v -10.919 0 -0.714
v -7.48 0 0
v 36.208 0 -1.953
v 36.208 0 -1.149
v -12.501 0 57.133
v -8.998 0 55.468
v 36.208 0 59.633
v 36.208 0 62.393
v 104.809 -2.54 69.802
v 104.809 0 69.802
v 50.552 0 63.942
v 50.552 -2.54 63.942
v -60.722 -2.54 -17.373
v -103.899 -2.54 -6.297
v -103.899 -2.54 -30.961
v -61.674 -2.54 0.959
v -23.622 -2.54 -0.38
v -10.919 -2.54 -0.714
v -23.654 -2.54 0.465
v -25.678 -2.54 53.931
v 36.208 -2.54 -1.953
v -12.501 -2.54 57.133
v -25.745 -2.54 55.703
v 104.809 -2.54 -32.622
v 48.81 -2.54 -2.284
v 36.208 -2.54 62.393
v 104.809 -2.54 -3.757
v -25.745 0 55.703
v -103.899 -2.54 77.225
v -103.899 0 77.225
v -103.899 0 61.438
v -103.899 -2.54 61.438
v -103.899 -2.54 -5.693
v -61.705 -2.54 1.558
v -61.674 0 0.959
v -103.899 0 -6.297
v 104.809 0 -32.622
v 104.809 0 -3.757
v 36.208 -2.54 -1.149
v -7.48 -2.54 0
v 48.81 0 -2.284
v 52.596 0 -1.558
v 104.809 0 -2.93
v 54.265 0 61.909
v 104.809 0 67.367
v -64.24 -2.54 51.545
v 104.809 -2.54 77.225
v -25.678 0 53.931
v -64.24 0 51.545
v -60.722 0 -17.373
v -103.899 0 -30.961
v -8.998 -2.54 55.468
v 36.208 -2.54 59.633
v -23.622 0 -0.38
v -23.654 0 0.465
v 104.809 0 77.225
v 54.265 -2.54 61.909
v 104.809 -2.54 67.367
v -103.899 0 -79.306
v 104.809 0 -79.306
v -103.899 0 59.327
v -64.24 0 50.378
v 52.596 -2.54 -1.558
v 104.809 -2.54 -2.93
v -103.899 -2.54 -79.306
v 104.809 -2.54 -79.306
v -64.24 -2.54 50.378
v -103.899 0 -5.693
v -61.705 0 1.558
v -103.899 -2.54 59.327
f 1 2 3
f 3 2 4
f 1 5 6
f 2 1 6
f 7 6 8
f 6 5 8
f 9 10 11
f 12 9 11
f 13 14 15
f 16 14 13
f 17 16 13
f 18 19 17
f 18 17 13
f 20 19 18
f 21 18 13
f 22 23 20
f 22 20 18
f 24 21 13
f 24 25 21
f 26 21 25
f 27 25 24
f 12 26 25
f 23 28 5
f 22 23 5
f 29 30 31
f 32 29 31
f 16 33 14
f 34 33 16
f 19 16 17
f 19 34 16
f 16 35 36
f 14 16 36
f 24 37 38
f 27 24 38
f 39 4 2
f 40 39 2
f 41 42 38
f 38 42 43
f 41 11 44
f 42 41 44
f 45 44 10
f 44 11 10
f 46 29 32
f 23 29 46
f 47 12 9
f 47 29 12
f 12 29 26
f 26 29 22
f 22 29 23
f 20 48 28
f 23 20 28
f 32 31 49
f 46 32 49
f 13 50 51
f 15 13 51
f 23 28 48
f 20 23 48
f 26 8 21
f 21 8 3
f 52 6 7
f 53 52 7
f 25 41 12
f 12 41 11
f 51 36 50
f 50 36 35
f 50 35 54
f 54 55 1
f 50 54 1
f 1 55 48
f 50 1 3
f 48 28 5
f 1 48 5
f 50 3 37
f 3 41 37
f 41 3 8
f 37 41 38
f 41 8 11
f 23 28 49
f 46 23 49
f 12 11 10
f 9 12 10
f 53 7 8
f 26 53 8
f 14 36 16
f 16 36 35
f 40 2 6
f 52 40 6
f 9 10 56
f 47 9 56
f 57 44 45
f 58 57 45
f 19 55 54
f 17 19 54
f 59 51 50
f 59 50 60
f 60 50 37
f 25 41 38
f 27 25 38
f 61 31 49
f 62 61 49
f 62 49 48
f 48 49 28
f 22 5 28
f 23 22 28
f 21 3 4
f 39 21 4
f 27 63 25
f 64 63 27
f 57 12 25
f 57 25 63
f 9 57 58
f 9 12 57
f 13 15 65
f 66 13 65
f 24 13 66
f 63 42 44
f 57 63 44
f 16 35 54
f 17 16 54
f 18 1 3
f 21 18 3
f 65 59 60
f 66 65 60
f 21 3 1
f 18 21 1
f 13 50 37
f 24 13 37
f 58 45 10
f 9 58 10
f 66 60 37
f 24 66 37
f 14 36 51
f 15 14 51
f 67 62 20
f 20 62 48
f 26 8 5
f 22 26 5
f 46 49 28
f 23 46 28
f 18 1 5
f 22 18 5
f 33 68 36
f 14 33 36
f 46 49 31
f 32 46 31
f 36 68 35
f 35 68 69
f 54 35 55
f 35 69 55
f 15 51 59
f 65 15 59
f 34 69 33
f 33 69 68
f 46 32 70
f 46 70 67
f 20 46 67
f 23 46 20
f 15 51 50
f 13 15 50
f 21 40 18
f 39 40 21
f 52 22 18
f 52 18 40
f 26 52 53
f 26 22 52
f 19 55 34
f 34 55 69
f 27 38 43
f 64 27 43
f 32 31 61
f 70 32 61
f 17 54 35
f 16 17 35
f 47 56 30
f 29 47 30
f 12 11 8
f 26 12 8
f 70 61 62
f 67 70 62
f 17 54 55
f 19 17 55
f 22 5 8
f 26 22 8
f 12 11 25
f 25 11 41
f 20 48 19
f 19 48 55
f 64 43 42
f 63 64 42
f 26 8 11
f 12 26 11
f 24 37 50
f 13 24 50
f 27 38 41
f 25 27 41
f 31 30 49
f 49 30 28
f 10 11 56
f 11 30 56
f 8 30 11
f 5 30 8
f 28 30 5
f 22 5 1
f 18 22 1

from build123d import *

# Parameters (mm, degrees)
F2_DEPTH = 2.54
F3_DEPTH = 2.54
F4_DEPTH = 2.54
F5_DEPTH = 2.54


with BuildPart() as f2:
    # F1 (on Front) → F2 (new body)
    with BuildSketch(Plane.XZ):
        Polygon((-60.72167, -17.372691), (-103.898698, -30.960672), (-103.898698, -79.305868), (104.809191, -79.305868), (104.809191, -32.622498), align=None)
    extrude(amount=F2_DEPTH)


with BuildPart() as f3:
    # F1 (on Front) → F3 (new body)
    with BuildSketch(Plane.XZ):
        Polygon((-61.673749, 0.958866), (-103.898698, -6.29724), (-103.898698, -30.960672), (-60.72167, -17.372691), align=None)
        Polygon((48.810381, -2.284143), (50.551797, 63.942278), (36.207689, 62.39319), (36.207689, 59.63257), (36.207689, -1.148774), (36.207689, -1.952756), (-10.918569, -0.713576), (-12.50122, 57.132883), (-25.744948, 55.70263), (-25.677872, 53.930861), (-23.653735, 0.464625), (-23.621777, -0.379547), (-61.673749, 0.958866), (-60.72167, -17.372691), (104.809191, -32.622498), (104.809191, -3.756626), align=None)
    extrude(amount=F3_DEPTH)


with BuildPart() as f4:
    # F1 (on Front) → F4 (new body)
    with BuildSketch(Plane.XZ):
        Polygon((104.809191, 67.367421), (104.809191, 69.801793), (50.551797, 63.942278), (54.265019, 61.908916), align=None)
        Polygon((54.265019, 61.908916), (50.551797, 63.942278), (48.810381, -2.284143), (52.596175, -1.557528), align=None)
        Polygon((104.809191, -3.756626), (104.809191, -2.930464), (52.596175, -1.557528), (48.810381, -2.284143), align=None)
        Polygon((-7.480396, 0), (-10.918569, -0.713576), (36.207689, -1.952756), (36.207689, -1.148774), align=None)
        Polygon((-8.997964, 55.467632), (-12.50122, 57.132883), (-10.918569, -0.713576), (-7.480396, 0), align=None)
        Polygon((36.207689, 59.63257), (36.207689, 62.39319), (-12.50122, 57.132883), (-8.997964, 55.467632), align=None)
        Polygon((-25.744948, 55.70263), (-64.240411, 51.545322), (-64.240411, 50.377974), (-25.677872, 53.930861), align=None)
        Polygon((-64.240411, 51.545322), (-103.898698, 61.438106), (-103.898698, 59.327256), (-64.240411, 50.377974), align=None)
        Polygon((-61.704853, 1.557751), (-103.898698, -5.69301), (-103.898698, -6.29724), (-61.673749, 0.958866), align=None)
        Polygon((-23.653735, 0.464625), (-61.704853, 1.557751), (-61.673749, 0.958866), (-23.621777, -0.379547), align=None)
    extrude(amount=F4_DEPTH)


with BuildPart() as f5:
    # F1 (on Front) → F5 (new body)
    with BuildSketch(Plane.XZ):
        Polygon((104.809191, 77.225049), (-103.898698, 77.225049), (-103.898698, 61.438106), (-64.240411, 51.545322), (-25.744948, 55.70263), (-12.50122, 57.132883), (36.207689, 62.39319), (50.551797, 63.942278), (104.809191, 69.801793), align=None)
    extrude(amount=F5_DEPTH)


solid = Compound([f2.part, f3.part, f4.part, f5.part])
